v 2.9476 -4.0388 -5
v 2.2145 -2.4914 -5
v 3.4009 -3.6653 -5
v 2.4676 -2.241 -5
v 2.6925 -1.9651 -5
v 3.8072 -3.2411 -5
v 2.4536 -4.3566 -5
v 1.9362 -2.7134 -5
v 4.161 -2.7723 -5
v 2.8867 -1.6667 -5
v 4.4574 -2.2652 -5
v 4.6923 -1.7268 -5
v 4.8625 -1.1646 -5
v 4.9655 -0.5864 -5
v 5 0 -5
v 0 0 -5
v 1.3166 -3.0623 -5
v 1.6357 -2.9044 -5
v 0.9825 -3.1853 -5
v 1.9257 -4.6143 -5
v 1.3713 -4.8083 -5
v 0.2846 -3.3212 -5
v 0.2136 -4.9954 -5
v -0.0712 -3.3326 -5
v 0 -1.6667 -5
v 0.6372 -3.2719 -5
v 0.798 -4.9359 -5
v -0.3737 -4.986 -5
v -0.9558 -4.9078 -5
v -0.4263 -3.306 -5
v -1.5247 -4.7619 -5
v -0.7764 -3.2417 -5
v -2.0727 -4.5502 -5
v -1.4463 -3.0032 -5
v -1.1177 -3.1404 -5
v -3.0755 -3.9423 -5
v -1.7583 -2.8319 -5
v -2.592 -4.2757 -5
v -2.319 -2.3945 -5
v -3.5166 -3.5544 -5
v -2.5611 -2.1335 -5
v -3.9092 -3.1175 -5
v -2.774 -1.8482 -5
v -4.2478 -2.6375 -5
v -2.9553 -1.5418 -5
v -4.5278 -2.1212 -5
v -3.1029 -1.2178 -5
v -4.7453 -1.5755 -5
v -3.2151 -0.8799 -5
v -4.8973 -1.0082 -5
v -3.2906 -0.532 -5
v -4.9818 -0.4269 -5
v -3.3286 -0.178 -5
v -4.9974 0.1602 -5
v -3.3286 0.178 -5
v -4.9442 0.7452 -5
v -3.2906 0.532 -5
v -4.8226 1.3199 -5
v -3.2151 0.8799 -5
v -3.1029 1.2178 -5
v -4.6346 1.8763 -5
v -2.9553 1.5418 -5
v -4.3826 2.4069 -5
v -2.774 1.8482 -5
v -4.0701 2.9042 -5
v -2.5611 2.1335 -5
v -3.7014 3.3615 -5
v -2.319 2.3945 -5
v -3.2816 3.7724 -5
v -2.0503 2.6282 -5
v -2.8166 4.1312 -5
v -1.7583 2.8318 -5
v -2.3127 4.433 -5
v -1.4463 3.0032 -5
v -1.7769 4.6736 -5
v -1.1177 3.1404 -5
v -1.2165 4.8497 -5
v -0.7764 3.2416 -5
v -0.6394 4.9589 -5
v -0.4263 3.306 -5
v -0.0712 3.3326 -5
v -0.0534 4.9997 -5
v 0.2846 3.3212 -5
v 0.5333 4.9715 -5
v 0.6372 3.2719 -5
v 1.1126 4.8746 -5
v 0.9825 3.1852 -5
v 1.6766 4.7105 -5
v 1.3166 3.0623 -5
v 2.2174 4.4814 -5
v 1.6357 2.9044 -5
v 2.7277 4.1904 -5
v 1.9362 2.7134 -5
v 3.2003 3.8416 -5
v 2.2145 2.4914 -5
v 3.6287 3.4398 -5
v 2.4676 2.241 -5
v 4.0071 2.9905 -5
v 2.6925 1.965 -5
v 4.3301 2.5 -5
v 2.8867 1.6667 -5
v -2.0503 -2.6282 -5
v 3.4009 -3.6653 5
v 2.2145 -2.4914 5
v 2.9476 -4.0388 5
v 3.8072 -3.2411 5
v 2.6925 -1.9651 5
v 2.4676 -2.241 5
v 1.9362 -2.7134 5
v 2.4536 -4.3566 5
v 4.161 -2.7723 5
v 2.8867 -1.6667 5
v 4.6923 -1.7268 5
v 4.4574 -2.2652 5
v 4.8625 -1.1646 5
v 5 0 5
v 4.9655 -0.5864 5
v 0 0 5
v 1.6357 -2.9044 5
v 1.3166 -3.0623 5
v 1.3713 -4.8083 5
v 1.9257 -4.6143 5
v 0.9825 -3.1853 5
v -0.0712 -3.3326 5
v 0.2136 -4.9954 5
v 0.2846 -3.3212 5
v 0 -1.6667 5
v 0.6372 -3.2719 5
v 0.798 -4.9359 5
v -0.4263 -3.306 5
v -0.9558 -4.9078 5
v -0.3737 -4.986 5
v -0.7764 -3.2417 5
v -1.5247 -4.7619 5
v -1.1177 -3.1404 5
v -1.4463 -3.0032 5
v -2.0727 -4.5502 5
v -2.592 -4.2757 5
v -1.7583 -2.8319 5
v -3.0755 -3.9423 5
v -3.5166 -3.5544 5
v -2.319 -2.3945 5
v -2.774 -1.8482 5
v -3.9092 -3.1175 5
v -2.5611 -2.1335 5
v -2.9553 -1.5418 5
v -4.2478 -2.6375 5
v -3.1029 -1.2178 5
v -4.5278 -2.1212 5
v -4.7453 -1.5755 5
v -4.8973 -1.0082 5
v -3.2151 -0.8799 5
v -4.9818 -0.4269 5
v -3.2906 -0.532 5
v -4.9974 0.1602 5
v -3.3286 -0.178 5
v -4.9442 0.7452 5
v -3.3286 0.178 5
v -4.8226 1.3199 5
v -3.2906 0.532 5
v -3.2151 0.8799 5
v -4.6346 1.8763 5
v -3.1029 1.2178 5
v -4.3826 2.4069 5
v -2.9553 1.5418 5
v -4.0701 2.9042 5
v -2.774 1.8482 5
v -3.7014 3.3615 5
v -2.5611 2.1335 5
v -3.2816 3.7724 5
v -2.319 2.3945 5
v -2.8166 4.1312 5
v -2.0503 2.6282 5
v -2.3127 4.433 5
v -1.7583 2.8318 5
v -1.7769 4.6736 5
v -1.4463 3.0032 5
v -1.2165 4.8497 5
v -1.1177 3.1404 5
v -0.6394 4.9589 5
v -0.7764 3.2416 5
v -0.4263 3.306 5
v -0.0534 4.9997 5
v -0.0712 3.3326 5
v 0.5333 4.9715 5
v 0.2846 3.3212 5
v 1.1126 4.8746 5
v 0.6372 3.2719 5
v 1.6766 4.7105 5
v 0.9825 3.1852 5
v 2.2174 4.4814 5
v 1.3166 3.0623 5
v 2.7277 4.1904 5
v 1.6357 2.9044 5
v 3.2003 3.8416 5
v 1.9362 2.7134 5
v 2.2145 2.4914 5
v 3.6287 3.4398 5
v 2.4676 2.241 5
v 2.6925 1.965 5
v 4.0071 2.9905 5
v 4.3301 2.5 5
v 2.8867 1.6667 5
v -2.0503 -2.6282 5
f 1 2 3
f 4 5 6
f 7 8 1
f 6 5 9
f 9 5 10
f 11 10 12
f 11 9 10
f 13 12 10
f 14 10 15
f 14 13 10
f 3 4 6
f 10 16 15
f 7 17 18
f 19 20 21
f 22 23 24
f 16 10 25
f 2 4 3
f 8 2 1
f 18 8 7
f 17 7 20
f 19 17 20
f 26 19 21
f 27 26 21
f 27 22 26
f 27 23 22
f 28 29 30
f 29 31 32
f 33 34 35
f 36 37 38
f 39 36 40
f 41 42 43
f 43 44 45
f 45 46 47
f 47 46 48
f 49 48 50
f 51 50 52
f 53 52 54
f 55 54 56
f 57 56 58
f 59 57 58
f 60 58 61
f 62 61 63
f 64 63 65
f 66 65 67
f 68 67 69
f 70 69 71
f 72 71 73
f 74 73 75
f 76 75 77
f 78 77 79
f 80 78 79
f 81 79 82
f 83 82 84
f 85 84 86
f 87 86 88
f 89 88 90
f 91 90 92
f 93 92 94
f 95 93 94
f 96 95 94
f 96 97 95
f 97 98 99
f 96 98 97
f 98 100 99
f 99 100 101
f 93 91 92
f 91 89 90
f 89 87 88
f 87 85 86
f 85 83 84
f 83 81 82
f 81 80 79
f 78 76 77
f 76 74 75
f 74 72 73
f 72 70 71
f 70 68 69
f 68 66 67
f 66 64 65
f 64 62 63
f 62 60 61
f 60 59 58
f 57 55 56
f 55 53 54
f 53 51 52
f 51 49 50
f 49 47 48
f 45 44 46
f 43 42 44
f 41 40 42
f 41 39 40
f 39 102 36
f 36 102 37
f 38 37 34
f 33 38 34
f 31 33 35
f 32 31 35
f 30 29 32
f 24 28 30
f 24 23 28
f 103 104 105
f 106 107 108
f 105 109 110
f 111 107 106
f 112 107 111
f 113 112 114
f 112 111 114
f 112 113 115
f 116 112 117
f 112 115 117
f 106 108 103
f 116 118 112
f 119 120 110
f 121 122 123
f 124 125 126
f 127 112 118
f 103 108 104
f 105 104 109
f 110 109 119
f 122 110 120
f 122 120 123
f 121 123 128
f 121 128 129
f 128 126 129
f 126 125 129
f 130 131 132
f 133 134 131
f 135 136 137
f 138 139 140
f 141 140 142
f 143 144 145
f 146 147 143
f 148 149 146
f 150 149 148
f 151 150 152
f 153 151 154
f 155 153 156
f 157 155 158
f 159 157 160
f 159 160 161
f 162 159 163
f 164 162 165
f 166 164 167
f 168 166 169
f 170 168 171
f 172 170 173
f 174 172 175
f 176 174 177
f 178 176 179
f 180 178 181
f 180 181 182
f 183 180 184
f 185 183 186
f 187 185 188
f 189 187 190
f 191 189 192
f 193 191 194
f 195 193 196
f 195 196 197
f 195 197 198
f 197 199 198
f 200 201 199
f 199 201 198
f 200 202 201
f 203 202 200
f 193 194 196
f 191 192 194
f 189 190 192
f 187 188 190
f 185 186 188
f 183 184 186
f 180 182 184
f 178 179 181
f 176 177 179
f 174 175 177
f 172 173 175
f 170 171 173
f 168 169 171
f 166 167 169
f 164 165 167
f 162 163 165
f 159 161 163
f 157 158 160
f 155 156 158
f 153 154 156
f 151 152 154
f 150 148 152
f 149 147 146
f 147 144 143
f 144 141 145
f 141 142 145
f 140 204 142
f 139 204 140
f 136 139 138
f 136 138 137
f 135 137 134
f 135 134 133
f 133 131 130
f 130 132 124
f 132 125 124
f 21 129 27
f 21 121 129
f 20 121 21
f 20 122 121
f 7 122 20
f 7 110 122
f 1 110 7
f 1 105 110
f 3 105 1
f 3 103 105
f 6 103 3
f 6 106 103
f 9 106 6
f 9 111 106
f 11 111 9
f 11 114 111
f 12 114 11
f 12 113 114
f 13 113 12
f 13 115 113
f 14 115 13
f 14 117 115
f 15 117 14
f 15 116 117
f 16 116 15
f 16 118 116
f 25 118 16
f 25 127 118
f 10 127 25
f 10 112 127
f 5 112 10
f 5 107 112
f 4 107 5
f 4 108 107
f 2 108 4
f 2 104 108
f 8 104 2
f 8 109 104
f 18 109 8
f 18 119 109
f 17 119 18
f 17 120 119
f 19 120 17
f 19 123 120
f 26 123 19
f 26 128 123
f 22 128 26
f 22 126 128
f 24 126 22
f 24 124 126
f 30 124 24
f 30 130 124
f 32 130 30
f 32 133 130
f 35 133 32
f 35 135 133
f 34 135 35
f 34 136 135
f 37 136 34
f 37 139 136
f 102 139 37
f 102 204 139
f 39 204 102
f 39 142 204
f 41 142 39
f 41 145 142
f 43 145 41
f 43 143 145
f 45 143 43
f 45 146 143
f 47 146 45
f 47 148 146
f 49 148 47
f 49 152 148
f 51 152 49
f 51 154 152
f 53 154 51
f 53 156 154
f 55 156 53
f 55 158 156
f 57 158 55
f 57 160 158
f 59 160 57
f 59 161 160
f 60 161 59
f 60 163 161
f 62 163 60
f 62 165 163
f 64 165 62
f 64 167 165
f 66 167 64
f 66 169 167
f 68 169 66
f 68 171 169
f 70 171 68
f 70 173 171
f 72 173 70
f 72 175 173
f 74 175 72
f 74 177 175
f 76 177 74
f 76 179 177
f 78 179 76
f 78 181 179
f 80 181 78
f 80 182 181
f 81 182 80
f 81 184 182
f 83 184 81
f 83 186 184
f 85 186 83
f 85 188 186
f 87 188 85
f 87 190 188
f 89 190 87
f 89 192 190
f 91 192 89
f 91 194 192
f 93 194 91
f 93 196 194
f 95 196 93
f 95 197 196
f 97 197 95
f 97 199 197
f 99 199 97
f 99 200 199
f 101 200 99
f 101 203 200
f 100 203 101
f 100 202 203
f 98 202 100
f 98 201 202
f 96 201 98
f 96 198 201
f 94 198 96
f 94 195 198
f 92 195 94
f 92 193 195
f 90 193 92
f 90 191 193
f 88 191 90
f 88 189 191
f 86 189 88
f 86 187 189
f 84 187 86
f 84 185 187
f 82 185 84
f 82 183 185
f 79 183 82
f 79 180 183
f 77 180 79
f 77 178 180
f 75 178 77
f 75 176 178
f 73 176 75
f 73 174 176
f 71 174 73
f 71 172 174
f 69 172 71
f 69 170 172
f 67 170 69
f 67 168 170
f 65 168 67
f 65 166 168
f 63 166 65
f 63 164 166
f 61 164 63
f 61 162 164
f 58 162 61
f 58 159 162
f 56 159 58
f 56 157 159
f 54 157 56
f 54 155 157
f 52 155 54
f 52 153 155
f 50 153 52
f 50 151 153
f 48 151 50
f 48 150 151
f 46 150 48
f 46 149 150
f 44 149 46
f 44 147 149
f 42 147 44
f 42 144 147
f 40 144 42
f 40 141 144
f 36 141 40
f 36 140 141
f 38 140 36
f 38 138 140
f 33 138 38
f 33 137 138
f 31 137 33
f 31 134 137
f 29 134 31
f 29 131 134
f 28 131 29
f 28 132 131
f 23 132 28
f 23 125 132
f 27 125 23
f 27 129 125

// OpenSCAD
// Generated by SolidPython 1.1.3 on 2025-02-21 17:32:18
$fn=50;


translate(v = [-5.0000000000, -5.0000000000, -5.0000000000]) {
	linear_extrude(height = 10) {
		polygon(points = [[9.3301270189, 7.5000000000], [9.0070681093, 7.9905526525], [8.6287102231, 8.4398346060], [8.2002748347, 8.8416456087], [7.7276745061, 9.1904405245], [7.2174312912, 9.4814058585], [6.6765867295, 9.7105261849], [6.1126046698, 9.8746395609], [5.5332682667, 9.9714811632], [4.9465725703, 9.9997145428], [4.3606141916, 9.9589500691], [3.7834795663, 9.8497503064], [3.2231333592, 9.6736222505], [2.6873085488, 9.4329965319], [2.1833997097, 9.1311938716], [1.7183609645, 8.7723792546], [1.2986100146, 8.3615044513], [0.9299395737, 7.9042396813], [0.6174374260, 7.4068953623], [0.3654162133, 6.8763350244], [0.1773539185, 6.3198805903], [0.0558458689, 5.7452113309], [0.0025689190, 5.1602578879], [0.0182583099, 4.5730928285], [0.1026975223, 3.9918192412], [0.2547212649, 3.4244589099], [0.4722315555, 2.8788416105], [0.7522266741, 2.3624970575], [1.0908425877, 1.8825509907], [1.4834062751, 1.4456268381], [1.9245002169, 1.0577543095], [2.4080371584, 0.7242861850], [2.9273441165, 0.4498244442], [3.4752544690, 0.2381567575], [4.0442068565, 0.0922042150], [4.6263495321, 0.0139810141], [5.2136487181, 0.0045666629], [5.7979994752, 0.0640910829], [6.3713375534, 0.1917328158], [6.9257506816, 0.3857303598], [7.4535877600, 0.6434064794], [7.9475644476, 0.9612051516], [8.4008636889, 1.3347406409], [8.8072297918, 1.7588580235], [9.1610547586, 2.2277043275], [9.4574556777, 2.7348093058], [9.6923421102, 3.2731747279], [9.8624725392, 3.8353709579], [9.9654991036, 4.4136394863], [10.0000000000, 5.0000000000], [5.0000000000, 5.0000000000], [5.0000000000, 3.3333333333], [7.8867513459, 3.3333333333], [7.6925298989, 3.0349570350], [7.4675933236, 2.7589970325], [7.2145075917, 2.5086013491], [6.9361597875, 2.2866263825], [6.6357251733, 2.0956043196], [6.3166309674, 1.9377142513], [5.9825172480, 1.8147573140], [5.6371954290, 1.7281361434], [5.2846047810, 1.6788388733], [4.9287674940, 1.6674278641], [4.5737427944, 1.6940332873], [4.2235806386, 1.7583516405], [3.8822755137, 1.8596492101], [3.5537208696, 1.9967704403], [3.2416647050, 2.1681511161], [2.9496668113, 2.3718362063], [2.6810581647, 2.6055021663], [2.4389029276, 2.8664834436], [2.2259634943, 3.1518028850], [2.0446689788, 3.4582056992], [1.8970875045, 3.7821965854], [1.7849026123, 4.1200796064], [1.7093940553, 4.4680003499], [1.6714231998, 4.8219898978], [1.6714231998, 5.1780101022], [1.7093940553, 5.5319996501], [1.7849026123, 5.8799203936], [1.8970875045, 6.2178034146], [2.0446689788, 6.5417943008], [2.2259634943, 6.8481971150], [2.4389029276, 7.1335165564], [2.6810581647, 7.3944978337], [2.9496668113, 7.6281637937], [3.2416647050, 7.8318488839], [3.5537208696, 8.0032295597], [3.8822755137, 8.1403507899], [4.2235806386, 8.2416483595], [4.5737427944, 8.3059667127], [4.9287674940, 8.3325721359], [5.2846047810, 8.3211611267], [5.6371954290, 8.2718638566], [5.9825172480, 8.1852426860], [6.3166309674, 8.0622857487], [6.6357251733, 7.9043956804], [6.9361597875, 7.7133736175], [7.2145075917, 7.4913986509], [7.4675933236, 7.2410029675], [7.6925298989, 6.9650429650], [7.8867513459, 6.6666666667]]);
	}
}
/***********************************************
*********      SolidPython code:      **********
************************************************
 
from solid import *
from solid.utils import *

import math
import matplotlib.pyplot as plt
import subprocess
import os
import pdb

def arc_points(radius, start_angle, end_angle, center=[0,0], num_points=50):
    angles = [start_angle + i * (end_angle - start_angle) / (num_points - 1)
              for i in range(num_points)]
    points = [
        (center[0] + radius * math.cos(math.radians(angle)),
         center[1] + radius * math.sin(math.radians(angle)))
        for angle in angles
    ]
    return points

class Hole:
    def __init__(self, radius, x, y):
        """
        Hole defined by:
        :param x: x dimension for center point of the circle as a ratio of letter height
        :param y: y dimension for center point of the circle as a ratio of letter height
        :param radius: radius of circle as a ratio of letter height
        """
        self.x = x
        self.y = y
        self.radius = radius

class Letter2D:
    def __init__(self, letter, scale):
        self.letter = letter
        self.scale = scale
        self.shape = self.generate()


    def get_letter_points(self):
        points = []
        if self.letter == "A":
            points = [(0,0), (1/2, 1), (1, 0), (5/6, 0), (2/3, 1/3), (1/3, 1/3), (1/6, 0)]
        if self.letter == "B":
            top_arc_points = arc_points(1/4, 90, -90, center=[3/4, 3/4])
            bottom_arc_points = arc_points(1/4, 90, -90, center=[3/4, 1/4])
            other_points = [(0,0),(0,1)]
            points = top_arc_points + bottom_arc_points + other_points
        if self.letter == "C":
            outer_arc_points = arc_points(1/2, 30, 330, center=[1/2,1/2])
            inner_arc_points = arc_points(1/4, 30, 330, center=[1/2,1/2])[::-1]
            points = outer_arc_points + inner_arc_points
        if self.letter == "D":
            outer_arc_points = arc_points(1/2, 90, -90, center= [1/2, 1/2])
            points = outer_arc_points + [(0,0), (0, 1)]
        if self.letter == "E":
            points = [(0,0), (1,0), (1,1/5), (1/5,1/5), (1/5,2/5), (3/4,2/5), (3/4,3/5), (1/5,3/5), (1/5,4/5), (1,4/5), (1,1), (0,1)]
        if self.letter == "F":
            points = [(0,0), (1/5,0), (1/5,2/5), (3/4,2/5), (3/4,3/5), (1/5,3/5), (1/5,4/5), (1,4/5), (1,1), (0,1)]
        if self.letter == "G":
            outer_arc_points = arc_points(1/2, 30, 360, center=[1/2,1/2])
            other_points = [(1/2,1/2), (1/2, 1/3)]
            x = sqrt((1/3)**2 - (1/6)**2)
            theta = math.degrees(math.atan((1/6)/x))
            inner_arc_points = arc_points(1/3, 360 - theta, 30, center=[1/2,1/2])
            points = outer_arc_points + other_points + inner_arc_points
        # TODO: change so these have line width 1/6 more in line with other styles
        if self.letter == "H":
            points = [(0,0), (1/3,0), (1/3,1/3), (2/3,1/3), (2/3,0), (1,0), (1,1), (2/3,1), (2/3,2/3), (1/3,2/3), (1/3,1), (0,1)]
        if self.letter == "I":
            points = [(0,0), (1,0), (1,1/3), (2/3,1/3), (2/3,2/3), (1,2/3), (1,1), (0,1), (0,2/3), (1/3,2/3), (1/3,1/3), (0,1/3)]

        scaled_points = [(p[0] * self.scale, p[1] * self.scale) for p in points]
        return scaled_points
    

    def get_letter_holes(self):
        holes = []
        if self.letter == "A": 
            holes = [Hole(1/6, 1/2, 7/12)]
        if self.letter == "B":
            holes = [Hole(1/6, 1/2, 3/4), Hole(1/6, 1/2, 1/4)]
        if self.letter == "D":
            holes = [Hole(1/2, 1/2, 1/6)]

        scaled_holes = [Hole(hole.radius*self.scale, hole.x*self.scale, hole.y*self.scale) for hole in holes]
        return scaled_holes

    
    def generate(self):
        outer_shape_points = self.get_letter_points()
        shape = polygon(points=outer_shape_points)
        holes = self.get_letter_holes()

        if holes:
            for hole in holes:
                circle_hole = circle(r=hole.radius)
                positioned_hole = translate([hole.x, hole.y])(circle_hole)
                shape = difference()(shape, positioned_hole)
        return shape
    
    def render(self):
        scad_render_to_file(self.shape, f"output/{self.name}.scad", file_header='$fn=50;')
        subprocess.run(["C:\\Program Files\\OpenSCAD\\openscad.exe", "-o", f"output\\{self.name}.stl", f"output\\{self.name}.scad"])


class TwoLetter3D:
    def __init__(self, height, letterA, letterB=None):
        self.height = height
        self.letterA = letterA
        self.letterB = letterB
    

    def generate_3d_letter(self, letter):
        letter = letter.upper()
        # TODO: add catch here for is letter is not a letter
        shape = Letter2D(letter, self.height).generate()
        shape_3d = linear_extrude(height=self.height)(shape)
        centered_shape_3d = translate([-self.height/2, -self.height/2, -self.height/2])(shape_3d)
        return centered_shape_3d


    def render(self):
        letterA3D = self.generate_3d_letter(self.letterA)

        if self.letterB:
            letterB3D = self.generate_3d_letter(self.letterB)
            letterB3D = rotate(a=90, v=[0,1,0])(letterB3D)

            combined = intersection()(letterA3D, letterB3D)
            file_name = self.letterA + self.letterB
            scad_render_to_file(combined, f"output/{file_name}.scad", file_header='$fn=50;')
            subprocess.run(["C:\\Program Files\\OpenSCAD\\openscad.exe", "-o", f"output\\{file_name}.stl", f"output\\{file_name}.scad"])
            return
        else:
            file_name = self.letterA
            scad_render_to_file(letterA3D, f"output/{file_name}.scad", file_header='$fn=50;')
            subprocess.run(["C:\\Program Files\\OpenSCAD\\openscad.exe", "-o", f"output\\{file_name}.stl", f"output\\{file_name}.scad"])
            return
                


if __name__ == "__main__":
    os.makedirs("output", exist_ok=True)
    
    letters = [chr(x) for x in range(ord('A'), ord('H') + 1)]

    # Generate all combos
    # for letter in letters:
    #     for other_letter in letters:
    #         shape = TwoLetter3D(10, letter, other_letter)
    #         shape.render()

    # Generate all letters
    # for letter in letters:
    #     shape = TwoLetter3D(10, letter, "z")
    #     shape.render()

    #Generate a letter
    shape = TwoLetter3D(10, "G")
    shape.render()
 
 
************************************************/
